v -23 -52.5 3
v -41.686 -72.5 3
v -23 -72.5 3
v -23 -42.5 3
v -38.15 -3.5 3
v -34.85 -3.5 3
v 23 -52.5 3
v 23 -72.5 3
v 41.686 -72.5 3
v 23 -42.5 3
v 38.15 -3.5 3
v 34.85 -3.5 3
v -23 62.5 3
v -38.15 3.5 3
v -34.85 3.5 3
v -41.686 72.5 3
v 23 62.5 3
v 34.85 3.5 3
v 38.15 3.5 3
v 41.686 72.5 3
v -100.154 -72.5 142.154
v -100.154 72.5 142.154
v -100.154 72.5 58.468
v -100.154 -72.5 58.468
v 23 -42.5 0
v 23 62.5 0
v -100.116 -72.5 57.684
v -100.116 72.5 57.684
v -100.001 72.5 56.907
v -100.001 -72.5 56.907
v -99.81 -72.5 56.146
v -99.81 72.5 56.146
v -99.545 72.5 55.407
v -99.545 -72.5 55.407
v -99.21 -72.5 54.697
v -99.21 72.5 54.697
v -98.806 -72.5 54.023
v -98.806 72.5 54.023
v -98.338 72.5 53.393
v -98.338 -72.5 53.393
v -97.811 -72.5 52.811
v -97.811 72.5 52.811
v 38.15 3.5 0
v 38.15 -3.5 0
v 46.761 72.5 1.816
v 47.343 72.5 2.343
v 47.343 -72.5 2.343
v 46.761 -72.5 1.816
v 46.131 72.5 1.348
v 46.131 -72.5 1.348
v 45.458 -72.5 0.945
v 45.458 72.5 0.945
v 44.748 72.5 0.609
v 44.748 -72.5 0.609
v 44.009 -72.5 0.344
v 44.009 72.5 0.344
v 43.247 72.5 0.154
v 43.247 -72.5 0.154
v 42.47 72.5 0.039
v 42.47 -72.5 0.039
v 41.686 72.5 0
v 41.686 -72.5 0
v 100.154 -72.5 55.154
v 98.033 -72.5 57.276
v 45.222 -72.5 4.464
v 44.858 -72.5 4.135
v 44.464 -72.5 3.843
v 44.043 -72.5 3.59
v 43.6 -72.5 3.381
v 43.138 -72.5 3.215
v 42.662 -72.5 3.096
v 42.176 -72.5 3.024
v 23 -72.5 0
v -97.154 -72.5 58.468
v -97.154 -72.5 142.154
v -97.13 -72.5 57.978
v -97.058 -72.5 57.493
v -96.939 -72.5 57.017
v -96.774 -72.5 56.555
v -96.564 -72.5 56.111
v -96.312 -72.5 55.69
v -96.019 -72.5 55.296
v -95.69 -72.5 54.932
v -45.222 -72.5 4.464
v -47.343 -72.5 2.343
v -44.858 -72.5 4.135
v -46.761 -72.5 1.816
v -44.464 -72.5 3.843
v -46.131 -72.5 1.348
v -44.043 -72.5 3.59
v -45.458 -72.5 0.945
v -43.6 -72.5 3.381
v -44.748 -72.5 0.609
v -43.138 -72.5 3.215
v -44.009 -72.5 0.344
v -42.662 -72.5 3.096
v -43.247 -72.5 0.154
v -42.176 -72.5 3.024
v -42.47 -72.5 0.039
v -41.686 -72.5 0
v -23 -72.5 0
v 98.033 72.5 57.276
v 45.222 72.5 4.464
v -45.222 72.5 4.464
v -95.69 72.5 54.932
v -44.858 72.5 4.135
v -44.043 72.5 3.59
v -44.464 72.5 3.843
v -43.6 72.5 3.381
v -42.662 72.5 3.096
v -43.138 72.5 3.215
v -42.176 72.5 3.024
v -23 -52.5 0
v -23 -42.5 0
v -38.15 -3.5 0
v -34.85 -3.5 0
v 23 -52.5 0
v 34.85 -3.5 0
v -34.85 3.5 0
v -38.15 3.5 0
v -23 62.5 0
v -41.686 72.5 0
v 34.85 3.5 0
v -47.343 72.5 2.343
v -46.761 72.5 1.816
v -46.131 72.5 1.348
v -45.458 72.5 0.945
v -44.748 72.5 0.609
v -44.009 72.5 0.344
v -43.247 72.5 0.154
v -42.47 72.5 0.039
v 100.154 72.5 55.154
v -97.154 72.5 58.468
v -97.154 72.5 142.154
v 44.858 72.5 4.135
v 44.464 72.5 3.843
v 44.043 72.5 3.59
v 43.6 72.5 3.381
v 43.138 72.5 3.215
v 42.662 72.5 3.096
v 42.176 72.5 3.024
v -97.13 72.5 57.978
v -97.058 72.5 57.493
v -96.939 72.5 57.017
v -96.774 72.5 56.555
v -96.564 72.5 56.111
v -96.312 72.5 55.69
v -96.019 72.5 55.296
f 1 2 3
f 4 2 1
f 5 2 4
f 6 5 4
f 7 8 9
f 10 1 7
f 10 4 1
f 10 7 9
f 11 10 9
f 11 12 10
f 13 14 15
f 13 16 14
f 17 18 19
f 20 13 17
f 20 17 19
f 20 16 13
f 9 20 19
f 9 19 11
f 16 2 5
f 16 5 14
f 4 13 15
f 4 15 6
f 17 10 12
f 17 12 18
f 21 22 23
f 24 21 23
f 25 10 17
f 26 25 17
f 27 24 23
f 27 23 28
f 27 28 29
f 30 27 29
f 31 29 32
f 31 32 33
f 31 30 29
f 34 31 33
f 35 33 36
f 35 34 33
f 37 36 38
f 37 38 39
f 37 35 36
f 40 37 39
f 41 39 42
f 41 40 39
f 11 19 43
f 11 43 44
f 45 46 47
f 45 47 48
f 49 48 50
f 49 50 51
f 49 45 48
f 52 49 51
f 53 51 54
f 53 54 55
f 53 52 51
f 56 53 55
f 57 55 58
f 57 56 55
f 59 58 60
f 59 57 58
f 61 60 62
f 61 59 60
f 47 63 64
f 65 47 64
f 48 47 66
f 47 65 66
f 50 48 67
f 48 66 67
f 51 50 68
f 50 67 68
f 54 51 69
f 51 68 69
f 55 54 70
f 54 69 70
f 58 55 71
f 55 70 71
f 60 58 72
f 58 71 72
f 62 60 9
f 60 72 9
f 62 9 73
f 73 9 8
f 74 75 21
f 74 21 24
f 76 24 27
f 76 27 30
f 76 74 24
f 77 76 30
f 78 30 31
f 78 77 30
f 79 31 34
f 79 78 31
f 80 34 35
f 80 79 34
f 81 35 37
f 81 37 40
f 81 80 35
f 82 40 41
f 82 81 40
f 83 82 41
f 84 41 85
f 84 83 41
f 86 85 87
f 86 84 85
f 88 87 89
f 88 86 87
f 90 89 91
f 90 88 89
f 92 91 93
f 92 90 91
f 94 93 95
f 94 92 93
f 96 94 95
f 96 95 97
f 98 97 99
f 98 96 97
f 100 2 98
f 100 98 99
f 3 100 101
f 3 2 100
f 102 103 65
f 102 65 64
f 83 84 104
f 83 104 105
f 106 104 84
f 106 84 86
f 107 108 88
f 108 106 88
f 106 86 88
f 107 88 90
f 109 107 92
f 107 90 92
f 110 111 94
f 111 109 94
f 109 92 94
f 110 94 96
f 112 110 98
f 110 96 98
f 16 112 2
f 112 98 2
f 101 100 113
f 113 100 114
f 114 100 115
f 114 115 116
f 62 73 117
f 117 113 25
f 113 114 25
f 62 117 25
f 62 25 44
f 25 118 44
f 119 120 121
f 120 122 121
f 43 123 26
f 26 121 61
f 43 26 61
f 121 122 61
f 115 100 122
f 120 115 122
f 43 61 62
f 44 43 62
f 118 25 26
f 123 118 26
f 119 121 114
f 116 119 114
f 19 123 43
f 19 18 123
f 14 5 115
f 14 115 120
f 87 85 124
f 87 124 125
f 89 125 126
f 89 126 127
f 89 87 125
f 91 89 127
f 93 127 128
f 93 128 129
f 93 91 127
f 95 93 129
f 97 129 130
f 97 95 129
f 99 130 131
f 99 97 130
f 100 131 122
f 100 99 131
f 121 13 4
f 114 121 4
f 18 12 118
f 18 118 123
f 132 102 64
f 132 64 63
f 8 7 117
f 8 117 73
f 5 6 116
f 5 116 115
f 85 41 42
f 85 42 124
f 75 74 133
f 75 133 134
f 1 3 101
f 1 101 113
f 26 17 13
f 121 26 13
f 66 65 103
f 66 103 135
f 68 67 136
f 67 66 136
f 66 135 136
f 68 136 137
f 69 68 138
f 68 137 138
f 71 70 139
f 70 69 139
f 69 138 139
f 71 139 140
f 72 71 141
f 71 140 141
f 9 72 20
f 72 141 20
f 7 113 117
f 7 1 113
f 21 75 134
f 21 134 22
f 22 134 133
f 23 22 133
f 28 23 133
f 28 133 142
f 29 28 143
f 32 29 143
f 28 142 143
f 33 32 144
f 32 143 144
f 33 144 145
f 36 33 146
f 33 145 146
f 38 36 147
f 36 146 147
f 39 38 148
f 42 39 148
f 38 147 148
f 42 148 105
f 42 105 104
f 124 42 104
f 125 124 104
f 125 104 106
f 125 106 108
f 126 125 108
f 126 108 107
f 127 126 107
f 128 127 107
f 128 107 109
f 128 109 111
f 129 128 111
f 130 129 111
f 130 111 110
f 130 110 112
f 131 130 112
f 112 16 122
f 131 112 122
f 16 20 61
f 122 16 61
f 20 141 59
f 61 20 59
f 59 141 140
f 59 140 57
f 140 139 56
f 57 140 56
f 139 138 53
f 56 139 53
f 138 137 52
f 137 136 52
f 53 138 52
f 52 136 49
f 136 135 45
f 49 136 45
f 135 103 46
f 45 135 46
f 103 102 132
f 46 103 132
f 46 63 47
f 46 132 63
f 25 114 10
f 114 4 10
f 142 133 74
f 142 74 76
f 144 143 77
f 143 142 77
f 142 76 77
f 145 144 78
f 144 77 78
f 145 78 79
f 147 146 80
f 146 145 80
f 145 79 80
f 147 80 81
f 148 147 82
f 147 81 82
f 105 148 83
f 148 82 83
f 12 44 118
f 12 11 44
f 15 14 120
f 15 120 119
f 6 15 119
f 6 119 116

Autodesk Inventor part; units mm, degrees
ref_plane "YZ Plane" through (0, 0, 0) normal (1, 0, 0) x (0, 1, 0)
ref_plane "XZ Plane" through (0, 0, 0) normal (0, 1, 0) x (-1, 0, 0)
ref_plane "XY Plane" through (0, 0, 0) normal (0, 0, 1) x (1, 0, 0)
sketch "Sketch1" plane through (0, 0, 0) normal (0, 0, 1) x (1, 0, 0)
  line L0 (-45, -72.5) -> (45, -72.5)
  line L1 (45, -72.5) -> (45, 72.5)
  line L2 (45, 72.5) -> (-45, 72.5)
  line L3 (-45, 72.5) -> (-45, -72.5)
  line L4 (-45, -72.5) -> (45, 72.5) construction
  line L5 (45, -72.5) -> (-45, 72.5) construction
  point P0 (0, 0)
  dimension "d154" = 90
  dimension "d155" = 145
extrude "Plate3" add sketch "Sketch1" along normal blind 3
sketch "Sketch7" plane through (42.8787, 72.5, 2.1213) normal (0.7071068, 0, -0.7071068) x (0, 1, 0)
  line L0 (-145, 0) -> (0, 0)
  line L1 (0, 0) -> (0, 78)
  line L2 (0, 78) -> (-145, 78)
  line L3 (-145, 78) -> (-145, 0)
edge flange "Flange3" height 78 angle 45 thickness 3 bend radius 5 thickness toward (0.7071068, 0, -0.7071068) relief round relief width 3 relief depth 1.5 corner gap 5 corner form 0 edges at (45, 0, 3) (-45, 0, 3) wall of the first edge with corners at (42.8787, -72.5, 2.1213) (42.8787, 72.5, 2.1213) (98.033, 72.5, 57.2756) (98.033, -72.5, 57.2756)
bend "Bend3"
corner "Corner3"
sketch "Sketch8" plane through (0, 0, 3) normal (0, 0, 1) x (1, 0, 0)
  line L0 (23, 62.5) -> (-23, 62.5)
  line L1 (-23, 62.5) -> (-23, -42.5)
  line L2 (-23, -42.5) -> (23, -42.5)
  line L3 (23, -42.5) -> (23, 62.5)
  line L4 (23, 62.5) -> (-23, -42.5) construction
  line L5 (-23, 62.5) -> (23, -42.5) construction
  line L6 (-45, 72.5) -> (41.6863, 72.5) projected
  line L7 (-41.6863, -72.5) -> (41.6863, -72.5) projected
  line L8 (23, -72.5) -> (-23, -72.5)
  line L9 (-23, -72.5) -> (-23, -52.5)
  line L10 (-23, -52.5) -> (23, -52.5)
  line L11 (23, -52.5) -> (23, -72.5)
  point P0 (0, 0)
  point P1 (0, 10)
  point P2 (-23, -72.5)
  point P3 (33.1873, -84)
  dimension "d166" = 46
  dimension "d168" = 10
  dimension "d182" = 10
  dimension "d183" = 20
extrude "Cut1" cut sketch "Sketch8" against normal blind 3
sketch "Sketch9" plane through (-97.1543, -72.5, 55.1543) normal (-1, 0, 0) x (0, -1, 0)
  line L0 (-145, 0) -> (0, 0)
  line L1 (0, 0) -> (0, 87)
  line L2 (0, 87) -> (-145, 87)
  line L3 (-145, 87) -> (-145, 0)
edge flange "Flange4" height 87 angle 45 thickness 3 bend radius 5 thickness toward (-1, 0, 0) relief round relief width 3 relief depth 1.5 edges at (-98.033, 0, 57.2756) wall of the first edge with corners at (-97.1543, 72.5, 55.1543) (-97.1543, -72.5, 55.1543) (-97.1543, -72.5, 142.1543) (-97.1543, 72.5, 142.1543)
bend "Bend4"
corner "Corner4"
sketch "Sketch10" plane through (0, 0, 3) normal (0, 0, 1) x (1, 0, 0)
  line L0 (-38.15, 3.5) -> (-34.85, 3.5)
  line L1 (-34.85, 3.5) -> (-34.85, -3.5)
  line L2 (-34.85, -3.5) -> (-38.15, -3.5)
  line L3 (-38.15, -3.5) -> (-38.15, 3.5)
  line L4 (-38.15, 3.5) -> (-34.85, -3.5) construction
  line L5 (-34.85, 3.5) -> (-38.15, -3.5) construction
  line L6 (34.85, 3.5) -> (38.15, 3.5)
  line L7 (38.15, 3.5) -> (38.15, -3.5)
  line L8 (38.15, -3.5) -> (34.85, -3.5)
  line L9 (34.85, -3.5) -> (34.85, 3.5)
  line L10 (34.85, 3.5) -> (38.15, -3.5) construction
  line L11 (38.15, 3.5) -> (34.85, -3.5) construction
  line L12 (0, 0) -> (0, 29.0693)
  line L13 (41.6863, -72.5) -> (23, -72.5) projected
  point P0 (-36.5, 0)
  point P1 (36.5, 0)
  point P2 (-36.5, 3.5)
  point P3 (36.5, 3.5)
  dimension "d184" = 7
  dimension "d185" = 3.3
  dimension "d186" = 69
  dimension "d187" = 73
extrude "Cut2" cut sketch "Sketch10" against normal blind 3
properties part number "DSB-101 Axis" material "Stainless Steel"
